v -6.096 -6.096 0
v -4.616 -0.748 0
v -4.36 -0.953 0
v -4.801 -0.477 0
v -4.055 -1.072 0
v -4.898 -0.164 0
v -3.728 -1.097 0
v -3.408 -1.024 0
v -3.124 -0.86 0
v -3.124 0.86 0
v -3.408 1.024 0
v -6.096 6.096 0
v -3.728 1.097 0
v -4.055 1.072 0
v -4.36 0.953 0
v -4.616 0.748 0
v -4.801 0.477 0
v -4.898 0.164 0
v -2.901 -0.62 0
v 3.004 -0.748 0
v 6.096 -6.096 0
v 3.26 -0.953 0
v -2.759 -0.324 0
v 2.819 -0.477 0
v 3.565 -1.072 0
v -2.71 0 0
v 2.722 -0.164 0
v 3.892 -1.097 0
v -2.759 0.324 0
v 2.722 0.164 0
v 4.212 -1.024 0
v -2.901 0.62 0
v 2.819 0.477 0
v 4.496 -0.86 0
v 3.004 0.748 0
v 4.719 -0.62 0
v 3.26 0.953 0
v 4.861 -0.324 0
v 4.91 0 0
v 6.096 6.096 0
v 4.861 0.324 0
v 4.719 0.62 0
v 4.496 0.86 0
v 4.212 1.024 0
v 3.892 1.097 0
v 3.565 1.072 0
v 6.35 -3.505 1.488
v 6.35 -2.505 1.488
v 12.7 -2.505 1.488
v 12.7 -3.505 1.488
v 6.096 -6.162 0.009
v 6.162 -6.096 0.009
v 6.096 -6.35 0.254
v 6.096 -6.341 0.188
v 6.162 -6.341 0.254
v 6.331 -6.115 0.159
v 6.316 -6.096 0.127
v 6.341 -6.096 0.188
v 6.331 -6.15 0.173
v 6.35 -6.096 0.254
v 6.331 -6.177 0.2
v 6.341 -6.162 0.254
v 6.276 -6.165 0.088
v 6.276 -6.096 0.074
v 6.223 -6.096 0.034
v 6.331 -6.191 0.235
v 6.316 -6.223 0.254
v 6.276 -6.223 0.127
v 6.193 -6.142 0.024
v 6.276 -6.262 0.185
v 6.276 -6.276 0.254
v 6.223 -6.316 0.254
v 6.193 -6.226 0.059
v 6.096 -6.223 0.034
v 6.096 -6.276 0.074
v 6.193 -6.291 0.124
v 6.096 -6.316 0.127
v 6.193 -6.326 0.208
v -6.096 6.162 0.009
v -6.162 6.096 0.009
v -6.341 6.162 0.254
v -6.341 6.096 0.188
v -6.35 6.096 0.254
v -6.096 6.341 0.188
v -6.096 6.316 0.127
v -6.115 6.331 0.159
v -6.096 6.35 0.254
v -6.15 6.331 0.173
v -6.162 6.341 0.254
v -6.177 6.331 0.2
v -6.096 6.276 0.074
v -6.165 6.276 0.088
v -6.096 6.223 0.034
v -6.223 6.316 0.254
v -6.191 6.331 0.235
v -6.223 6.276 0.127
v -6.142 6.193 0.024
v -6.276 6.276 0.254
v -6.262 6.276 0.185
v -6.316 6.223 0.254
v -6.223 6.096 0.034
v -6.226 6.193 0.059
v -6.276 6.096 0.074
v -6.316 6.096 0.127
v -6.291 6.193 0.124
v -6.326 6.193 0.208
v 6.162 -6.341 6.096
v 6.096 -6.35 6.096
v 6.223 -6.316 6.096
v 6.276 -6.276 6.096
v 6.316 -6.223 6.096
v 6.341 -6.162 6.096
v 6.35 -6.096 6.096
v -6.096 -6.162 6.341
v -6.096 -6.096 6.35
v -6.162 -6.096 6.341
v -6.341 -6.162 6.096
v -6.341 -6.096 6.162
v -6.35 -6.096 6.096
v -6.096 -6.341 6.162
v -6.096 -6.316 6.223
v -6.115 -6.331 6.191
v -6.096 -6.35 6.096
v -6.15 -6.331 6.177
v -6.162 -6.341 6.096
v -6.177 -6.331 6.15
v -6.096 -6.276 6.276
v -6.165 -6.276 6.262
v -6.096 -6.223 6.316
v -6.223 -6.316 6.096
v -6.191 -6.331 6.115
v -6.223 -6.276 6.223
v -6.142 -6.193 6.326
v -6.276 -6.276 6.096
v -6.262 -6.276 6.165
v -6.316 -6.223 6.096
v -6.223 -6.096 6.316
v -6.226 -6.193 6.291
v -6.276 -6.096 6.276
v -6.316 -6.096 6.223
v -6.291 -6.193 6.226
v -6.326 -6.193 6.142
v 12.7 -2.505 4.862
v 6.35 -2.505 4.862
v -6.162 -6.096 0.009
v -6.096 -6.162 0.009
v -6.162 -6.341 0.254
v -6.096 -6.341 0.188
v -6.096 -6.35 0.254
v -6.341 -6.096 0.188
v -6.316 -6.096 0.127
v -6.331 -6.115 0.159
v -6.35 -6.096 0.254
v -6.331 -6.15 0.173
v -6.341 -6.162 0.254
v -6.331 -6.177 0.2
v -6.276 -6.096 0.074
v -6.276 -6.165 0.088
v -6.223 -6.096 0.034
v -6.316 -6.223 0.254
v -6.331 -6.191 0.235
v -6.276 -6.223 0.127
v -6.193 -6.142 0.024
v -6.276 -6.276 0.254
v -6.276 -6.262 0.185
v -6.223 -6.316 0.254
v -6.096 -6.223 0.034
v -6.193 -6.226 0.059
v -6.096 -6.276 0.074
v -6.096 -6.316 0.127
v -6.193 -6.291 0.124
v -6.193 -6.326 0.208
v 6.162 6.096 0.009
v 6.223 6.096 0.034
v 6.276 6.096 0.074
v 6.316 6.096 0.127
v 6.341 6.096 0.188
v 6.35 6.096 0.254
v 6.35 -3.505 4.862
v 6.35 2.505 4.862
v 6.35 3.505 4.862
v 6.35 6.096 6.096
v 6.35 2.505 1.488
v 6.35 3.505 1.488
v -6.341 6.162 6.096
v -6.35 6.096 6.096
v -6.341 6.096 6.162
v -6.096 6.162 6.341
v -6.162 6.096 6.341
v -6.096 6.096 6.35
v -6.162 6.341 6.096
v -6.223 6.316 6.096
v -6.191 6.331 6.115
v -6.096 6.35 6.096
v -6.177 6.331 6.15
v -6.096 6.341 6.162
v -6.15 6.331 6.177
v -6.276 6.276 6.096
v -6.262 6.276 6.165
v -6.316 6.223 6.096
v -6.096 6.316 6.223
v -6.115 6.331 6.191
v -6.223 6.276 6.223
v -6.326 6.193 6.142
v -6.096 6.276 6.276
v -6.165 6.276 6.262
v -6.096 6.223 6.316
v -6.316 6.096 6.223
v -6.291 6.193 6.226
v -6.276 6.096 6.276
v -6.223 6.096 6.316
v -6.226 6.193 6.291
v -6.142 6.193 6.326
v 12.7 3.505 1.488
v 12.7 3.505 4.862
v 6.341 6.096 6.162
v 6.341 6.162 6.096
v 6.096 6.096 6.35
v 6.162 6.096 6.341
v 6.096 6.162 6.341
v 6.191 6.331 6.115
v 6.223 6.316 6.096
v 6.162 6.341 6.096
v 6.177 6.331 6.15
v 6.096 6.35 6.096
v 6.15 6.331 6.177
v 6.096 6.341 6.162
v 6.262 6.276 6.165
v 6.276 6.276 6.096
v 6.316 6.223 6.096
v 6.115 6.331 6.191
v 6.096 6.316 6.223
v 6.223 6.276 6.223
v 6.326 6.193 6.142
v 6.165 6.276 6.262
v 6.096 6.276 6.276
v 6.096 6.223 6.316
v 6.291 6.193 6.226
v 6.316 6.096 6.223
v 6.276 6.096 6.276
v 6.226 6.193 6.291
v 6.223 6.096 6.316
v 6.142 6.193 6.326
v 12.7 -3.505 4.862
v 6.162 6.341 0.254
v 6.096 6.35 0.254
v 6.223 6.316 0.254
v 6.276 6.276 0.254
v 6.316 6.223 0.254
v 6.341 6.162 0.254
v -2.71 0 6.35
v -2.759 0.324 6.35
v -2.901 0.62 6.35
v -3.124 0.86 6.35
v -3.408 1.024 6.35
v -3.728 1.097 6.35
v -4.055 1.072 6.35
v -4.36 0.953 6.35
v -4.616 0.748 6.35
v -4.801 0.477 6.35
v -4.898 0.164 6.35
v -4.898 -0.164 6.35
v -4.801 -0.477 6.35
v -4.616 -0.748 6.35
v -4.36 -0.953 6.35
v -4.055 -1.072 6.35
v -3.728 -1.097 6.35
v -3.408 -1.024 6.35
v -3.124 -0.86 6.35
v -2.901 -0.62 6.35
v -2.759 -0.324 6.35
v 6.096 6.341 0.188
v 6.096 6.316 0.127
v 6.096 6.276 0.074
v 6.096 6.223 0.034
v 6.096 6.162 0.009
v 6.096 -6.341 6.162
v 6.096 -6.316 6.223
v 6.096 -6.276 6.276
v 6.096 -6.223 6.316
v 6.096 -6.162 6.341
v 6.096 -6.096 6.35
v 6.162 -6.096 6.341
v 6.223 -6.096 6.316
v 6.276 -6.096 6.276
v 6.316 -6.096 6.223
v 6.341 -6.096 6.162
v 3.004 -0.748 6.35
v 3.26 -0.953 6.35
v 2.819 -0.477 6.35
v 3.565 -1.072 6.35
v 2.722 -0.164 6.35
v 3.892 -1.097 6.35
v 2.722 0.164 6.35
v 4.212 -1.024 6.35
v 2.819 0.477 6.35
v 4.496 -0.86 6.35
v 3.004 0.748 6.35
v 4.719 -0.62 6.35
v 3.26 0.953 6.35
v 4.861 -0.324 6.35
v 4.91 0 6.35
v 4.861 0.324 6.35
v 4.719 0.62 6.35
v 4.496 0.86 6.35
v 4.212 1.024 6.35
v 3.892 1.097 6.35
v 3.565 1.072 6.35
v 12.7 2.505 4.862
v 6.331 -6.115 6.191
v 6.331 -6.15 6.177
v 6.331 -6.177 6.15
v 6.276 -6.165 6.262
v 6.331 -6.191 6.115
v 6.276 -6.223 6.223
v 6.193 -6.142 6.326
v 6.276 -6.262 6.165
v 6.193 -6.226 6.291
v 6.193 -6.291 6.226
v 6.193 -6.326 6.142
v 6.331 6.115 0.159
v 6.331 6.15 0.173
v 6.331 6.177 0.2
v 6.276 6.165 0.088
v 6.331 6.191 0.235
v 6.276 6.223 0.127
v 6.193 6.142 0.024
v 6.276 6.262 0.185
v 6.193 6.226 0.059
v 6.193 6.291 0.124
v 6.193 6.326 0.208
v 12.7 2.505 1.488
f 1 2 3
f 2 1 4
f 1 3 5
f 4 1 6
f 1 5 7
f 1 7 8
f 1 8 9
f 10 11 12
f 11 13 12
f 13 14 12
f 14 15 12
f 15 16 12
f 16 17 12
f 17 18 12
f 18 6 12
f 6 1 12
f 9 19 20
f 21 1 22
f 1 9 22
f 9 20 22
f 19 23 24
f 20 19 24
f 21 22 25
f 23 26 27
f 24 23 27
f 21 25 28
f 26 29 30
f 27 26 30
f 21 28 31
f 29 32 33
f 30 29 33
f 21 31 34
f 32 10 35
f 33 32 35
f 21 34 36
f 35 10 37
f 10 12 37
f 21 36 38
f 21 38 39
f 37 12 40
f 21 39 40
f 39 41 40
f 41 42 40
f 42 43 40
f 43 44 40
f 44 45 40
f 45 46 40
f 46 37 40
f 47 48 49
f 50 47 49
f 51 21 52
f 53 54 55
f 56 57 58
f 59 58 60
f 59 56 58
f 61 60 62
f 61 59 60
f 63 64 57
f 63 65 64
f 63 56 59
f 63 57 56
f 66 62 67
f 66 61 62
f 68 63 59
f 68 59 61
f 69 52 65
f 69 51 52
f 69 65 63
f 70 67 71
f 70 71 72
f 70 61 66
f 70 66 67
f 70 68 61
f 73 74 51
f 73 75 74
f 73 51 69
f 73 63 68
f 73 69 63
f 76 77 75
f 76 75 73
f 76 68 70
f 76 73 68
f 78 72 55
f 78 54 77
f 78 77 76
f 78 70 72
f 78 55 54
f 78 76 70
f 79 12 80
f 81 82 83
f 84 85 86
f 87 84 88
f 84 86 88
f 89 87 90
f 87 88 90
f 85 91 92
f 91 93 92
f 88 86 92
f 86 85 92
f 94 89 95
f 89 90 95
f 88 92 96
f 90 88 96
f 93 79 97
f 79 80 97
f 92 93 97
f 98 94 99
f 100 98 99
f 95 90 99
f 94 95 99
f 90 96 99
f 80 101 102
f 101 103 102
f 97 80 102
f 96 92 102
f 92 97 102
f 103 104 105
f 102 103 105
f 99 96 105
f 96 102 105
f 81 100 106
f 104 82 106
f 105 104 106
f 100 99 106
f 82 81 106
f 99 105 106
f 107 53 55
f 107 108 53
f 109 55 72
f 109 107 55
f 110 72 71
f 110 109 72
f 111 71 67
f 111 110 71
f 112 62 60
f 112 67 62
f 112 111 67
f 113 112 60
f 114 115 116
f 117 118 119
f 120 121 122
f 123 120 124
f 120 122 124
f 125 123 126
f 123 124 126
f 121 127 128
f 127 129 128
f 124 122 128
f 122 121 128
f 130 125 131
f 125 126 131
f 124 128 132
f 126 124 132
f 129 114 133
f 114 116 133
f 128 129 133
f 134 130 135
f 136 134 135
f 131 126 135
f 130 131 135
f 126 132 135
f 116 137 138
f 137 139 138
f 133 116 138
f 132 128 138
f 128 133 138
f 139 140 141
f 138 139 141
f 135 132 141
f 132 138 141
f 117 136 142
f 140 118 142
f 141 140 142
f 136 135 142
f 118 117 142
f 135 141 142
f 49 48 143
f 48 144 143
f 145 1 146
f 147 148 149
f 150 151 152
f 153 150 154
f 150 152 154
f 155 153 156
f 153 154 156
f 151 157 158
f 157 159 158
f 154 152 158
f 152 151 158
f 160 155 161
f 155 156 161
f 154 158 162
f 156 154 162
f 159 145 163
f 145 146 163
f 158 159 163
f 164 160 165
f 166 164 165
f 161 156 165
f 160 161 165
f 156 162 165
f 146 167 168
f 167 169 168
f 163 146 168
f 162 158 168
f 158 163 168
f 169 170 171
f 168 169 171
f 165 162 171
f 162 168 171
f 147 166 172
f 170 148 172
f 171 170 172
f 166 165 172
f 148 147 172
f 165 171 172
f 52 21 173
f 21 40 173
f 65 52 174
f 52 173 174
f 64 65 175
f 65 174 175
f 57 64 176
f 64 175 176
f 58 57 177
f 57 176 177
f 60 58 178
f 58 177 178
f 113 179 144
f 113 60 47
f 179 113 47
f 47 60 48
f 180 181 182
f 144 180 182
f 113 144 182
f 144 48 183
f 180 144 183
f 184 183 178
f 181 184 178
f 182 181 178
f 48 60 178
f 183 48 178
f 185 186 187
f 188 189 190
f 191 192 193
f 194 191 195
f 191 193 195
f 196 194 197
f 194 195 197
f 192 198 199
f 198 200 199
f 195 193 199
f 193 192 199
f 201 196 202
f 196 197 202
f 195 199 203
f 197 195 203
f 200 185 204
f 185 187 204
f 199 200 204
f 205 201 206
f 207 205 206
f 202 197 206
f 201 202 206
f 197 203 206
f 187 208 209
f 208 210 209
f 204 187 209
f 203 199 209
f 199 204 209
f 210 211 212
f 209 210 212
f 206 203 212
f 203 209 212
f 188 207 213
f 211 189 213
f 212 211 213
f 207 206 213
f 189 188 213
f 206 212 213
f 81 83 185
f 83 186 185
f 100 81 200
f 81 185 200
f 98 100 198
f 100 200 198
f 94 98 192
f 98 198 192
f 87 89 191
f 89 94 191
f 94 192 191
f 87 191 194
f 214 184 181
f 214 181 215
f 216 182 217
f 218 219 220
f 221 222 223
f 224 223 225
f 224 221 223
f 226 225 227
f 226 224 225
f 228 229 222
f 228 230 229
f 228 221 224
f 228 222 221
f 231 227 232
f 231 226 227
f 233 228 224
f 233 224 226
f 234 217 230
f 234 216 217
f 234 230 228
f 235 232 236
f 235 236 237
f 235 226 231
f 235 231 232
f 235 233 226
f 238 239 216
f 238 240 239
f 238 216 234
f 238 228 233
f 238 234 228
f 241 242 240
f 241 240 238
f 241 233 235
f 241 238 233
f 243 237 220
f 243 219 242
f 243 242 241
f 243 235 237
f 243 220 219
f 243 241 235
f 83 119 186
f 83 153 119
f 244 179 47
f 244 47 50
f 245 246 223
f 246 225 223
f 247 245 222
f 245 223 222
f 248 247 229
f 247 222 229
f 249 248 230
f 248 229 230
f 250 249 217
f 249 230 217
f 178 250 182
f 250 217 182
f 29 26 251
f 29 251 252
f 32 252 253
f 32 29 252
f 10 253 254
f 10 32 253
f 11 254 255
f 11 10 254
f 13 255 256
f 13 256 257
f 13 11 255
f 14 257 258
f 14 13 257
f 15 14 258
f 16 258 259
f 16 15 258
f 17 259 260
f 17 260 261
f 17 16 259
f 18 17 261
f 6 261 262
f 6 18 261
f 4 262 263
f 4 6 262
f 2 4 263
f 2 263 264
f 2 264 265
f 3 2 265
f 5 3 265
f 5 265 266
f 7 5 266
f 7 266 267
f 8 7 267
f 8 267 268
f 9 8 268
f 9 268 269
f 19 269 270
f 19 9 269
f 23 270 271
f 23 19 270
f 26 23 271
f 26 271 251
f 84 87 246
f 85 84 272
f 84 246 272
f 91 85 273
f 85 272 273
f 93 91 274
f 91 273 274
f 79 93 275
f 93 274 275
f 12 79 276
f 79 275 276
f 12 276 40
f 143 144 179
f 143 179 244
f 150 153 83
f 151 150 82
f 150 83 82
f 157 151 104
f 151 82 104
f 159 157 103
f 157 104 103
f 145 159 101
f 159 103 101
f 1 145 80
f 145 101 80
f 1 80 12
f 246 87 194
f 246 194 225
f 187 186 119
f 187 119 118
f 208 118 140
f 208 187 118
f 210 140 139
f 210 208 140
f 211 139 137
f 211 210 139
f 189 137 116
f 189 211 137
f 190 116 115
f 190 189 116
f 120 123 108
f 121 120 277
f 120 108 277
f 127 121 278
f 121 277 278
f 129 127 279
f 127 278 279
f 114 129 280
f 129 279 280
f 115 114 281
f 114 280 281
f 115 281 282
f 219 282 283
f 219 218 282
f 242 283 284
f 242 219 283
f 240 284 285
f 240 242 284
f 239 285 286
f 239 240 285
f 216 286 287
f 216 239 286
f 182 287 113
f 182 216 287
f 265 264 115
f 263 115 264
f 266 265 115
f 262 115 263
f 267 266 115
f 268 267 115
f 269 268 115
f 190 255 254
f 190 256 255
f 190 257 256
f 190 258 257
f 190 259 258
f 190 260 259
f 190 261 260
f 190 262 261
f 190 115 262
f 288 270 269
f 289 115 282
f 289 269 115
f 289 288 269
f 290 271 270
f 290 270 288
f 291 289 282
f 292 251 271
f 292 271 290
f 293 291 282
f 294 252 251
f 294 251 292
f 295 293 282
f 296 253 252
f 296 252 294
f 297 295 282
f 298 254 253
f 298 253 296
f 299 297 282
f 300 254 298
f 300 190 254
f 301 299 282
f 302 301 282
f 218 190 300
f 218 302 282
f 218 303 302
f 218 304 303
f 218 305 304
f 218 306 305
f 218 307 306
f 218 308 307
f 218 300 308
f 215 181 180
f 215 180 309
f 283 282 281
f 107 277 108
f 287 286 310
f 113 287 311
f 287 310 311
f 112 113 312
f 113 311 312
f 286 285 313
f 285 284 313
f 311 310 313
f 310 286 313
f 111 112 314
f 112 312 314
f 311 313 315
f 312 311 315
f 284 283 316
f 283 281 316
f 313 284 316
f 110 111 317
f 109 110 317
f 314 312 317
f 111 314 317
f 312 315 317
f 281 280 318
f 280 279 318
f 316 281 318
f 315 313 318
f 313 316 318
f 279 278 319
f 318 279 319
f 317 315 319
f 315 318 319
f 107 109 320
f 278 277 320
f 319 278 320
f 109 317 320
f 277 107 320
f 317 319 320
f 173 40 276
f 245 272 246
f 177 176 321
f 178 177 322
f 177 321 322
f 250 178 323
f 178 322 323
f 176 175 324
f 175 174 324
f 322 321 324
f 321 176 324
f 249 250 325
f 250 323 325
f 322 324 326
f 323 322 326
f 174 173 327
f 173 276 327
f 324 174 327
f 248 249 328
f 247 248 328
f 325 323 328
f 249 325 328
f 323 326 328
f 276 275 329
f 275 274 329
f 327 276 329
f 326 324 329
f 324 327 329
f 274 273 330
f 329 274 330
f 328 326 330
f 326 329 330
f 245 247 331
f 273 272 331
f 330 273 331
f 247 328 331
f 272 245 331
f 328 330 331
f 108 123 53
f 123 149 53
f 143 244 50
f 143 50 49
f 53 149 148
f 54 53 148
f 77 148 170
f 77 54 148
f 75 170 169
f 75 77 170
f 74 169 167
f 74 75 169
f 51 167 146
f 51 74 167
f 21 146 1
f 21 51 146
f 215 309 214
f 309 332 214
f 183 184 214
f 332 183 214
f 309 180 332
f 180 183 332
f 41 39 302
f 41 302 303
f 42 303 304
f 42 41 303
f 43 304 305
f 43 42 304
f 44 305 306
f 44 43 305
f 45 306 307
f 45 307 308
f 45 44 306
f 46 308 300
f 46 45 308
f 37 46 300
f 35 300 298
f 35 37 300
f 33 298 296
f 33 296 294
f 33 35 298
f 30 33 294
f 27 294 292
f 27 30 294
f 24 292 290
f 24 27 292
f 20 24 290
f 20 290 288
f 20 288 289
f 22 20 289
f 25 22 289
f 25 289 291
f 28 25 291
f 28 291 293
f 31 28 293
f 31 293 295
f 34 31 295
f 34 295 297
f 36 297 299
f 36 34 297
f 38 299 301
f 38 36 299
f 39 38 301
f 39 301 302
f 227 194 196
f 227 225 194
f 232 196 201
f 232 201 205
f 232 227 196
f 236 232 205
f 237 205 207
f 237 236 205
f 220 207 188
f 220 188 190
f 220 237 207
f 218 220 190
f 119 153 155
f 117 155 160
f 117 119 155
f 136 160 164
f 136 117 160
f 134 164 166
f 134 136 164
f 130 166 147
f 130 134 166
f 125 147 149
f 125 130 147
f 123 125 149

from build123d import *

# Parameters (mm, degrees)
SKETCH1_W           = 12.7
SKETCH1_H           = 12.7
SKETCH1_R           = 1.1
BOSS_EXTRUDE1_DEPTH = 6.35
SKETCH2_W           = 6.35
SKETCH2_H           = 1
BOSS_EXTRUDE2_DEPTH = 1.68671875
FILLET1_R           = 0.254


with BuildPart() as part:
    # Sketch1 → Boss-Extrude1 (new body)
    with BuildSketch(Plane.XY):
        Rectangle(SKETCH1_W, SKETCH1_H)
        with Locations((-3.81, 0)):
            Circle(SKETCH1_R, mode=Mode.SUBTRACT)
        with Locations((3.81, 0)):
            Circle(SKETCH1_R, mode=Mode.SUBTRACT)
    extrude(amount=BOSS_EXTRUDE1_DEPTH)

    # Sketch2 → Boss-Extrude2 (add, symmetric)
    with BuildSketch(Plane.XY.offset(3.175)):
        with Locations((9.525, 3.0048)):
            Rectangle(SKETCH2_W, SKETCH2_H)
        with Locations((9.525, -3.0048)):
            Rectangle(SKETCH2_W, SKETCH2_H)
    extrude(amount=BOSS_EXTRUDE2_DEPTH, both=True)

    # Fillet1
    fillet1_edges = [part.edges().sort_by_distance(p)[0] for p in [
        (-6.35, 0, 6.35),
        (0, -6.35, 6.35),
        (6.35, 0, 6.35),
        (0, -6.35, 0),
        (-6.35, 0, 0),
        (0, 6.35, 0),
        (6.35, 0, 0),
        (6.35, -6.35, 3.175),
        (-6.35, -6.35, 3.175),
        (-6.35, 6.35, 3.175),
        (6.35, 6.35, 3.175),
        (0, 6.35, 6.35),
    ]]
    fillet(fillet1_edges, radius=FILLET1_R)


solid = part.part
